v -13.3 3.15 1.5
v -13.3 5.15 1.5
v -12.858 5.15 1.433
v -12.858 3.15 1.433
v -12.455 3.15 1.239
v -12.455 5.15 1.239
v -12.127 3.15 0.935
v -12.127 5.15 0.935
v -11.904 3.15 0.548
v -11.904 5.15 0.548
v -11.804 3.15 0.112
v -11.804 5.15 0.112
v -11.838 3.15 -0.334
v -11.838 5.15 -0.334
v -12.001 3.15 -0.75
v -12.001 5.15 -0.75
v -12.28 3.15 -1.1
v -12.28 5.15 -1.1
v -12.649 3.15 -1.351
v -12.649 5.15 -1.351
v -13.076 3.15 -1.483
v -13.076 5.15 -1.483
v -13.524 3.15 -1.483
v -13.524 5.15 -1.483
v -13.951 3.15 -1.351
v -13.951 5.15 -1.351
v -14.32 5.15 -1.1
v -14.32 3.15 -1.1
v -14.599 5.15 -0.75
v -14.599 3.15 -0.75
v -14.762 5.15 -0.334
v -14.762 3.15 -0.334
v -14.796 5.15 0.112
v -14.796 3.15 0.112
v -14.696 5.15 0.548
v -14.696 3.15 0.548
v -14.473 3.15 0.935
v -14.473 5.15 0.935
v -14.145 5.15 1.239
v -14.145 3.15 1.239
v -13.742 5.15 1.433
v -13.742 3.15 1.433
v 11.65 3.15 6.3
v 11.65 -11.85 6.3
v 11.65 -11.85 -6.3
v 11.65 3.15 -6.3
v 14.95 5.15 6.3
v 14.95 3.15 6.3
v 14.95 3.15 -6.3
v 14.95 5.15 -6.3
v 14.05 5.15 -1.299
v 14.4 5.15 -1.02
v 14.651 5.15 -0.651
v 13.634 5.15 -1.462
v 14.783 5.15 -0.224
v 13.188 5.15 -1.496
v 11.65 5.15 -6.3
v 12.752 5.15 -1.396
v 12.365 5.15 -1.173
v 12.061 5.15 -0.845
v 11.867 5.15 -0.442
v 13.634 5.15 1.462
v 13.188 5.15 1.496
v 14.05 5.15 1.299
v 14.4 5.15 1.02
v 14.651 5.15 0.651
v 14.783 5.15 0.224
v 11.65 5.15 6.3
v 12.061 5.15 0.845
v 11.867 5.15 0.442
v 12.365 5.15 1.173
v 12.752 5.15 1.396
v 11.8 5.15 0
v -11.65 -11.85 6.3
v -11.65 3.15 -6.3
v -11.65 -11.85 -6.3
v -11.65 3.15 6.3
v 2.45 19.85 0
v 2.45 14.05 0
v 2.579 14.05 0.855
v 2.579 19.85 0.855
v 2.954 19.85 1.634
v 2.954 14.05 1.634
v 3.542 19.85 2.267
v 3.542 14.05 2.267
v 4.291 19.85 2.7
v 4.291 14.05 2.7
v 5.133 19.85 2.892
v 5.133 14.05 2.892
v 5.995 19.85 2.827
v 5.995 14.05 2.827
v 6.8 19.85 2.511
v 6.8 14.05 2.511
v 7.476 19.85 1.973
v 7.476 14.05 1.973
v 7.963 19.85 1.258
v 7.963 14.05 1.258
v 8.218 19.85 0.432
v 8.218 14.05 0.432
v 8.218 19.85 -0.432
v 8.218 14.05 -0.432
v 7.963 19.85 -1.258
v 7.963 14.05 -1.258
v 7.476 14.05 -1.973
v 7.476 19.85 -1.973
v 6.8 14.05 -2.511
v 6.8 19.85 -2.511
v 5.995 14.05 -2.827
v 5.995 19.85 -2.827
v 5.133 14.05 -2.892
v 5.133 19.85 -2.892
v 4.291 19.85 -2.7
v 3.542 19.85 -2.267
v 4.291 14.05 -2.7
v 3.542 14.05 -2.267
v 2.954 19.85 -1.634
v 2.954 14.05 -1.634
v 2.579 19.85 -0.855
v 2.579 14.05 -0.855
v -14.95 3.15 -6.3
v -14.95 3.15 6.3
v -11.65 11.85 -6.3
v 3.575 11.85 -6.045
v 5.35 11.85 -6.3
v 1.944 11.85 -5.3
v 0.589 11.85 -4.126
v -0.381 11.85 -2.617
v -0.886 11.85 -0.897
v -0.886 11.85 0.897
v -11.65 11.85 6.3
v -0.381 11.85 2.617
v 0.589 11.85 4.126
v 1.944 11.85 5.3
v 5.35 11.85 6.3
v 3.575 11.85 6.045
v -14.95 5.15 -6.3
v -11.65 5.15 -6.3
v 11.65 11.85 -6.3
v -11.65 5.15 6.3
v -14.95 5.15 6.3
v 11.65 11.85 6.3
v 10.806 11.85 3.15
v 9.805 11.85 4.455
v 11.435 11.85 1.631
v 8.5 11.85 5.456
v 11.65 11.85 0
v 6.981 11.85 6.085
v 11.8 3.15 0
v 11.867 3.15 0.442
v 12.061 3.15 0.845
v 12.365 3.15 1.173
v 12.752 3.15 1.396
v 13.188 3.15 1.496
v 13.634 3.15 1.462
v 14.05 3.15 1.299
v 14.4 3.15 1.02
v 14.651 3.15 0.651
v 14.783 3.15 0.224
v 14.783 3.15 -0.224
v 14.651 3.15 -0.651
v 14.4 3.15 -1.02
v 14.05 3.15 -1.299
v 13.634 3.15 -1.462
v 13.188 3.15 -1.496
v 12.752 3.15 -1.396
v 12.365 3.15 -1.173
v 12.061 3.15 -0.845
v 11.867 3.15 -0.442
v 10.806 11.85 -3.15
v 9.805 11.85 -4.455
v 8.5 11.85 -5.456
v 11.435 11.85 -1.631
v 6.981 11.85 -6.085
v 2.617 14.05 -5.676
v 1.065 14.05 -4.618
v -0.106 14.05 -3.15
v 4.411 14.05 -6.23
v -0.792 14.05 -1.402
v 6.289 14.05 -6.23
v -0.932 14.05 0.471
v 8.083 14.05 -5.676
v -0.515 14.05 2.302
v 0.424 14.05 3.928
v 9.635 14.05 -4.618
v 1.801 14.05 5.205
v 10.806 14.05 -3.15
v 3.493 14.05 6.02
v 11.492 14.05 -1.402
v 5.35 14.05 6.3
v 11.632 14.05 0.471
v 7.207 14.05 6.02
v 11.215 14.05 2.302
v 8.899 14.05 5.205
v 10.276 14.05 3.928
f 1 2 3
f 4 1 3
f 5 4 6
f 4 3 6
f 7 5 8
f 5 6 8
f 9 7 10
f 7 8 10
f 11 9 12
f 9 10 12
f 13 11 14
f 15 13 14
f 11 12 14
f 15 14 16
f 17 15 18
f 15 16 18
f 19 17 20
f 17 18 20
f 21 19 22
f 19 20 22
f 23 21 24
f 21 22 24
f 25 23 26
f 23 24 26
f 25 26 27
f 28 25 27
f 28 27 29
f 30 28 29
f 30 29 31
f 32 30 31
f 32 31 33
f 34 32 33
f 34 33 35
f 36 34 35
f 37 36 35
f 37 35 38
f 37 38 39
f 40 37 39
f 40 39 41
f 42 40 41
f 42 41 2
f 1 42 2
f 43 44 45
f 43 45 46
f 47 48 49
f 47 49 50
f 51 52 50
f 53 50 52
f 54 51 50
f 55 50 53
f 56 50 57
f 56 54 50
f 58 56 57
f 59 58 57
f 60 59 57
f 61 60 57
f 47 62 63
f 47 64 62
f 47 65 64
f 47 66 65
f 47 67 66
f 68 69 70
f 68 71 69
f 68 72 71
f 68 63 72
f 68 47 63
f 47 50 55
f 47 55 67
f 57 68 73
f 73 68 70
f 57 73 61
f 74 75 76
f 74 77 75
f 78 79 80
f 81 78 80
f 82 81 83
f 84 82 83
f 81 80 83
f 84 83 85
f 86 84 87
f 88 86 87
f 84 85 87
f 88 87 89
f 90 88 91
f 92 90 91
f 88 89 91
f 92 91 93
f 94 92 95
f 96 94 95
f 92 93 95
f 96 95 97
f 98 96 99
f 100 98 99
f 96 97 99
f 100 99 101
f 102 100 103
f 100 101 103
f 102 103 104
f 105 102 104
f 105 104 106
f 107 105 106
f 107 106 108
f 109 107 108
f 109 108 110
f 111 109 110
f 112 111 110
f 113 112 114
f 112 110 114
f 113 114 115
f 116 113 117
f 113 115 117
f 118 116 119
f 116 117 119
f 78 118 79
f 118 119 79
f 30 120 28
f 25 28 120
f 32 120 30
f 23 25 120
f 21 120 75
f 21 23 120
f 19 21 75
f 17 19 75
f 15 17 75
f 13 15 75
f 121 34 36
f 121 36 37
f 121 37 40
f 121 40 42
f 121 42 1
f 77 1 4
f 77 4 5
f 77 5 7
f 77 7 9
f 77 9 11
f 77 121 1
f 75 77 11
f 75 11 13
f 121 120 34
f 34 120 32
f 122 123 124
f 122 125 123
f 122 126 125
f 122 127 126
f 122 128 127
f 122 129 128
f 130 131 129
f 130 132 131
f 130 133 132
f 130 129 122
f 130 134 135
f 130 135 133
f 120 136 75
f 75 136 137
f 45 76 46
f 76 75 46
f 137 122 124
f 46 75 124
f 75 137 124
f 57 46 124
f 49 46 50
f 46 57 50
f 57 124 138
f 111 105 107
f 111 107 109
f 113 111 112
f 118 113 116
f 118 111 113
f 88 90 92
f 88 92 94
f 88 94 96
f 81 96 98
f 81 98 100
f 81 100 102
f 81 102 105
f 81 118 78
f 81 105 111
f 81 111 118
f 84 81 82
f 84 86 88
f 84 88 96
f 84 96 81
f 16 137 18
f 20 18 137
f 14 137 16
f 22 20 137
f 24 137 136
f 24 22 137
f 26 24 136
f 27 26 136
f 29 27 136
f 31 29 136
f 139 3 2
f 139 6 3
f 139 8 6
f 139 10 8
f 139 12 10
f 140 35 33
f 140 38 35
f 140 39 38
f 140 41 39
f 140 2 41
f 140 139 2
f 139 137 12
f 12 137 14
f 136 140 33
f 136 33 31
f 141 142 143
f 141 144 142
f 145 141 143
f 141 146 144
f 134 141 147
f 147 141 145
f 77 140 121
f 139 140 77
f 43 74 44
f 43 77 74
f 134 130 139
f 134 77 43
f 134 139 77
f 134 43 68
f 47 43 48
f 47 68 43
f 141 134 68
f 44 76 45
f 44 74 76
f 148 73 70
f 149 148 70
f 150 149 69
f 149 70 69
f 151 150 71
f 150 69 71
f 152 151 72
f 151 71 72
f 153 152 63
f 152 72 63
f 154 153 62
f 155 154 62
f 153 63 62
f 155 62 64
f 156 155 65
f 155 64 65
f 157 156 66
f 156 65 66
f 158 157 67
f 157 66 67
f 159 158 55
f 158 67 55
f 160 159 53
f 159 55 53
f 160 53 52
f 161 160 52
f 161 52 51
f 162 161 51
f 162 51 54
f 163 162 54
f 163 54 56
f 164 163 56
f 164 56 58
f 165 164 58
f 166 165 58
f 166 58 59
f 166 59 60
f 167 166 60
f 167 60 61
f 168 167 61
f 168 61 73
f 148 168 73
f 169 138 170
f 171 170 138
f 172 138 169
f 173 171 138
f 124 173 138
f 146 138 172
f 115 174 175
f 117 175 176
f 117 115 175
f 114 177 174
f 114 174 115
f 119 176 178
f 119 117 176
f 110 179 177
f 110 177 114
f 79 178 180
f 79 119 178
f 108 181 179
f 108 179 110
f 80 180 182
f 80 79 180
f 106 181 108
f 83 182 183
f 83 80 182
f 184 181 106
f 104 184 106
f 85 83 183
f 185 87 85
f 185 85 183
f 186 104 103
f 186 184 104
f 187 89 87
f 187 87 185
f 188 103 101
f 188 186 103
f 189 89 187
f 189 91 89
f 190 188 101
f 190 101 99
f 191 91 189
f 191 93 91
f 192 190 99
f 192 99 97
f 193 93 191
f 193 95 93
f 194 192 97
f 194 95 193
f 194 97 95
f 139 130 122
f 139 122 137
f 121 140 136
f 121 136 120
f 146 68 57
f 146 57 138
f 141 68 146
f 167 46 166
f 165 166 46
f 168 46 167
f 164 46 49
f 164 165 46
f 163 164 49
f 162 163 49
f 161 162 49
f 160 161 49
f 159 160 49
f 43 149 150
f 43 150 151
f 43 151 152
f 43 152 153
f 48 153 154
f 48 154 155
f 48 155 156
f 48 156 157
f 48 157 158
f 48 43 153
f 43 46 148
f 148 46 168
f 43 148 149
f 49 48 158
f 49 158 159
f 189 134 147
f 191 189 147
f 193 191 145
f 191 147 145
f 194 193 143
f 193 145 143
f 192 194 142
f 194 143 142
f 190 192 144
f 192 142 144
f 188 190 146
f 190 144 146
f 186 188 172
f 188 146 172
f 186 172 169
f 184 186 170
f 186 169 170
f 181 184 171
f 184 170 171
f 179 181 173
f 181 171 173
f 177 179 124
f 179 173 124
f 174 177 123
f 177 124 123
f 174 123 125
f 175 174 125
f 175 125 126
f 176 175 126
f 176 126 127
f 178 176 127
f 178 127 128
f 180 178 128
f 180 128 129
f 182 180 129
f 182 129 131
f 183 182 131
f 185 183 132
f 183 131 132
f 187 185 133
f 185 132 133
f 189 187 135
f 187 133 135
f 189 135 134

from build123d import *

# Parameters (mm, degrees)
EXTRUDE_1_DEPTH     = 6.3
SKETCH_2_R          = 6.3
SKETCH_2_R_2        = 2.9
EXTRUDE_2_DEPTH     = 2.2
EXTRUDE_START       = 2.2
SKETCH_2_3_R        = 2.9
EXTRUDE_3_DEPTH     = 5.8
SKETCH_3_R          = 1.5
CUT_EXTRUDE_1_DEPTH = 5.8


with BuildPart() as part:
    # Эскиз1 → Бобышка-Вытянуть1 (new, symmetric)
    with BuildSketch(Plane.XY):
        Polygon((-11.65, -11.85), (11.65, -11.85), (11.65, 3.15), (14.95, 3.15), (14.95, 5.15), (11.65, 5.15), (11.65, 11.85), (-11.65, 11.85), (-11.65, 5.15), (-14.95, 5.15), (-14.95, 3.15), (-11.65, 3.15), align=None)
    extrude(amount=EXTRUDE_1_DEPTH, both=True)

    # Эскиз2 → Бобышка-Вытянуть2 (add)
    with BuildSketch(Plane(origin=(0, 11.85, 0), x_dir=(1, 0, 0), z_dir=(0, 1, 0))):
        with Locations(Location((5.35, 0, 0), (0, 0, 270))):
            Circle(SKETCH_2_R)
        with Locations((5.35, 0)):
            Circle(SKETCH_2_R_2, mode=Mode.SUBTRACT)
        with Locations((5.35, 0)):
            Circle(SKETCH_2_R_2)
    extrude(amount=EXTRUDE_2_DEPTH)

    # Эскиз2<3> → Бобышка-Вытянуть3 (add)
    with BuildSketch(Plane(origin=(0, 11.85, 0), x_dir=(1, 0, 0), z_dir=(0, 1, 0)).offset(EXTRUDE_START)):
        with Locations(Location((5.35, 0, 0), (0, 0, 180))):
            Circle(SKETCH_2_3_R)
    extrude(amount=EXTRUDE_3_DEPTH)

    # Эскиз3 → Вырез-Вытянуть1 (cut)
    with BuildSketch(Plane(origin=(0, 5.15, 0), x_dir=(1, 0, 0), z_dir=(0, 1, 0))):
        with Locations(Location((-13.3, 0, 0), (0, 0, 270))):
            Circle(SKETCH_3_R)
        with Locations(Location((13.3, 0, 0), (0, 0, 180))):
            Circle(SKETCH_3_R)
    extrude(amount=-CUT_EXTRUDE_1_DEPTH, mode=Mode.SUBTRACT)


solid = part.part
